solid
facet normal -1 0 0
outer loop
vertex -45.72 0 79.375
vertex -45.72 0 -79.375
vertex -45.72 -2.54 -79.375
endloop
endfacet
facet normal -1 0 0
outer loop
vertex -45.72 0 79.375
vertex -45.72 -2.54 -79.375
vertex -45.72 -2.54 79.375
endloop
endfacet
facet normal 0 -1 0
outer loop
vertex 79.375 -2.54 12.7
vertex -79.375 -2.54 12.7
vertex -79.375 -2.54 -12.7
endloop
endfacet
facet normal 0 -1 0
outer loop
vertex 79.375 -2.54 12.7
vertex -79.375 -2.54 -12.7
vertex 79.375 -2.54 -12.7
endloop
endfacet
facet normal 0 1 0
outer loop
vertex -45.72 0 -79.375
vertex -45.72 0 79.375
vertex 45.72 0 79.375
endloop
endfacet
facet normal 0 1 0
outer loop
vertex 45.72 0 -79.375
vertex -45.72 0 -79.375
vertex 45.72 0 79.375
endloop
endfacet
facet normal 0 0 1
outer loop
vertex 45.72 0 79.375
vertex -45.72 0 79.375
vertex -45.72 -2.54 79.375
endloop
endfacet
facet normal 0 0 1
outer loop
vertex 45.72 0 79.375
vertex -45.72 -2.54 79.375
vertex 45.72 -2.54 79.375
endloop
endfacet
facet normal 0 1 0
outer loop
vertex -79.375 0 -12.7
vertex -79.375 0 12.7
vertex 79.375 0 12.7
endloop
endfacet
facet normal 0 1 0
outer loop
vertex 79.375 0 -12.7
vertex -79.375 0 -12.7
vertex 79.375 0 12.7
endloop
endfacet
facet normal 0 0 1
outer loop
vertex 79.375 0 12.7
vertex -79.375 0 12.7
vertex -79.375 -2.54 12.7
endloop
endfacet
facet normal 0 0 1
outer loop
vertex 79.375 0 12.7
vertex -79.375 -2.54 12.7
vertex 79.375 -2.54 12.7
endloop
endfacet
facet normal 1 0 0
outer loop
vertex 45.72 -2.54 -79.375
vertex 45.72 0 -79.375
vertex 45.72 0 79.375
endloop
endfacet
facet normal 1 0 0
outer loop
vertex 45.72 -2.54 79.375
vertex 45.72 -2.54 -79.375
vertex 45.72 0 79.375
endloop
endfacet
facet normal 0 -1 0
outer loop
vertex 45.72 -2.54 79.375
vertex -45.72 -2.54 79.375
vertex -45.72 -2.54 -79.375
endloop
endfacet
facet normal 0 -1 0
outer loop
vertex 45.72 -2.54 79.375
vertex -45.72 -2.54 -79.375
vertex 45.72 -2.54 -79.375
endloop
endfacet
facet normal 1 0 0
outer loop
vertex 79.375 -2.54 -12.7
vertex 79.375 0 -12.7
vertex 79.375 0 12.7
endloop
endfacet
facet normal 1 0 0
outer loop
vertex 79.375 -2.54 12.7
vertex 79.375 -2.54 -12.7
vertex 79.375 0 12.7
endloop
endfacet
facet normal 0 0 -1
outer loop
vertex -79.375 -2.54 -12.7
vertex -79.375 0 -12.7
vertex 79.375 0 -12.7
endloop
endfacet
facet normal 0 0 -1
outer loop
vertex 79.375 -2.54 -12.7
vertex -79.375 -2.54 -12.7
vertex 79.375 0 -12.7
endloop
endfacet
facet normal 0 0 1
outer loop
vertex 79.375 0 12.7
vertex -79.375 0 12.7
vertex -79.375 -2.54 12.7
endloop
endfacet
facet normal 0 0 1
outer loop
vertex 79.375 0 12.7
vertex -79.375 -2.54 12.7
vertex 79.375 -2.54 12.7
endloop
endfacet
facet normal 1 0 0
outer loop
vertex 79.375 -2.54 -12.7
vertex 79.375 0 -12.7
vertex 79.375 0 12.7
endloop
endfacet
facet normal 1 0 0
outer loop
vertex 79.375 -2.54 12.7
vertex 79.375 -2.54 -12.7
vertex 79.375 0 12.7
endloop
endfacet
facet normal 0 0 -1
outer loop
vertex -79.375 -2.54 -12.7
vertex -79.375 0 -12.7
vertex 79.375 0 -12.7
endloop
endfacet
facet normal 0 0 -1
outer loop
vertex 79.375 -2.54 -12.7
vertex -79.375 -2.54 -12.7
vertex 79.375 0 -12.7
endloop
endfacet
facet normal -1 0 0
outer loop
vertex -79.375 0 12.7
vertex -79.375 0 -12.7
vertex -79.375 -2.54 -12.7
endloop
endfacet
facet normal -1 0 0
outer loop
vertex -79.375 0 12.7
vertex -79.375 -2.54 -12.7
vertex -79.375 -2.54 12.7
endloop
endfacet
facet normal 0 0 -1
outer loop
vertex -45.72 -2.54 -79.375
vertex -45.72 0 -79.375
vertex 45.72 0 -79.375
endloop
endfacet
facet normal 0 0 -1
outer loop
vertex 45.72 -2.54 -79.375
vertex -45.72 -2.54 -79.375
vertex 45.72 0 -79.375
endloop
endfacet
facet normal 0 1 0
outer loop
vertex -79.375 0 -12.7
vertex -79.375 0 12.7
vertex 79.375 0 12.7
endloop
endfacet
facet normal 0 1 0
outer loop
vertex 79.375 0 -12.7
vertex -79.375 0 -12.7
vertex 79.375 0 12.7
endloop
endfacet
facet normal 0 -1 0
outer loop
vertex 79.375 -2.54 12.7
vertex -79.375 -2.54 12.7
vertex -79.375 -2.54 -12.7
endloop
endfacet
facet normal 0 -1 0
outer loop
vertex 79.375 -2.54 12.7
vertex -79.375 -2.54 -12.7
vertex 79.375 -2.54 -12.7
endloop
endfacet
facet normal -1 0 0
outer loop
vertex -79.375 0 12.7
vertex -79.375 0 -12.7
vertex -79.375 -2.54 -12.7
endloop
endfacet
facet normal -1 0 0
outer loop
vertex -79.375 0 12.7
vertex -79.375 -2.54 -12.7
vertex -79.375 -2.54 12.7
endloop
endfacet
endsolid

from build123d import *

# Parameters (mm, degrees)
F0_W     = 158.75
F0_H     = 25.4
F1_DEPTH = 2.54
F2_W     = 158.75
F2_H     = 25.4
F3_DEPTH = 2.54
F4_W     = 91.44
F4_H     = 158.75
F5_DEPTH = 2.54


with BuildPart() as f1:
    # F0 (on Front) → F1 (new body)
    with BuildSketch(Plane.XZ):
        Rectangle(F0_W, F0_H)
    extrude(amount=F1_DEPTH)


with BuildPart() as f3:
    # F2 (on Front) → F3 (new body)
    with BuildSketch(Plane.XZ):
        Rectangle(F2_W, F2_H)
    extrude(amount=F3_DEPTH)


with BuildPart() as f5:
    # F4 (on Front) → F5 (new body)
    with BuildSketch(Plane.XZ):
        Rectangle(F4_W, F4_H)
    extrude(amount=F5_DEPTH)


solid = Compound([f1.part, f3.part, f5.part])
